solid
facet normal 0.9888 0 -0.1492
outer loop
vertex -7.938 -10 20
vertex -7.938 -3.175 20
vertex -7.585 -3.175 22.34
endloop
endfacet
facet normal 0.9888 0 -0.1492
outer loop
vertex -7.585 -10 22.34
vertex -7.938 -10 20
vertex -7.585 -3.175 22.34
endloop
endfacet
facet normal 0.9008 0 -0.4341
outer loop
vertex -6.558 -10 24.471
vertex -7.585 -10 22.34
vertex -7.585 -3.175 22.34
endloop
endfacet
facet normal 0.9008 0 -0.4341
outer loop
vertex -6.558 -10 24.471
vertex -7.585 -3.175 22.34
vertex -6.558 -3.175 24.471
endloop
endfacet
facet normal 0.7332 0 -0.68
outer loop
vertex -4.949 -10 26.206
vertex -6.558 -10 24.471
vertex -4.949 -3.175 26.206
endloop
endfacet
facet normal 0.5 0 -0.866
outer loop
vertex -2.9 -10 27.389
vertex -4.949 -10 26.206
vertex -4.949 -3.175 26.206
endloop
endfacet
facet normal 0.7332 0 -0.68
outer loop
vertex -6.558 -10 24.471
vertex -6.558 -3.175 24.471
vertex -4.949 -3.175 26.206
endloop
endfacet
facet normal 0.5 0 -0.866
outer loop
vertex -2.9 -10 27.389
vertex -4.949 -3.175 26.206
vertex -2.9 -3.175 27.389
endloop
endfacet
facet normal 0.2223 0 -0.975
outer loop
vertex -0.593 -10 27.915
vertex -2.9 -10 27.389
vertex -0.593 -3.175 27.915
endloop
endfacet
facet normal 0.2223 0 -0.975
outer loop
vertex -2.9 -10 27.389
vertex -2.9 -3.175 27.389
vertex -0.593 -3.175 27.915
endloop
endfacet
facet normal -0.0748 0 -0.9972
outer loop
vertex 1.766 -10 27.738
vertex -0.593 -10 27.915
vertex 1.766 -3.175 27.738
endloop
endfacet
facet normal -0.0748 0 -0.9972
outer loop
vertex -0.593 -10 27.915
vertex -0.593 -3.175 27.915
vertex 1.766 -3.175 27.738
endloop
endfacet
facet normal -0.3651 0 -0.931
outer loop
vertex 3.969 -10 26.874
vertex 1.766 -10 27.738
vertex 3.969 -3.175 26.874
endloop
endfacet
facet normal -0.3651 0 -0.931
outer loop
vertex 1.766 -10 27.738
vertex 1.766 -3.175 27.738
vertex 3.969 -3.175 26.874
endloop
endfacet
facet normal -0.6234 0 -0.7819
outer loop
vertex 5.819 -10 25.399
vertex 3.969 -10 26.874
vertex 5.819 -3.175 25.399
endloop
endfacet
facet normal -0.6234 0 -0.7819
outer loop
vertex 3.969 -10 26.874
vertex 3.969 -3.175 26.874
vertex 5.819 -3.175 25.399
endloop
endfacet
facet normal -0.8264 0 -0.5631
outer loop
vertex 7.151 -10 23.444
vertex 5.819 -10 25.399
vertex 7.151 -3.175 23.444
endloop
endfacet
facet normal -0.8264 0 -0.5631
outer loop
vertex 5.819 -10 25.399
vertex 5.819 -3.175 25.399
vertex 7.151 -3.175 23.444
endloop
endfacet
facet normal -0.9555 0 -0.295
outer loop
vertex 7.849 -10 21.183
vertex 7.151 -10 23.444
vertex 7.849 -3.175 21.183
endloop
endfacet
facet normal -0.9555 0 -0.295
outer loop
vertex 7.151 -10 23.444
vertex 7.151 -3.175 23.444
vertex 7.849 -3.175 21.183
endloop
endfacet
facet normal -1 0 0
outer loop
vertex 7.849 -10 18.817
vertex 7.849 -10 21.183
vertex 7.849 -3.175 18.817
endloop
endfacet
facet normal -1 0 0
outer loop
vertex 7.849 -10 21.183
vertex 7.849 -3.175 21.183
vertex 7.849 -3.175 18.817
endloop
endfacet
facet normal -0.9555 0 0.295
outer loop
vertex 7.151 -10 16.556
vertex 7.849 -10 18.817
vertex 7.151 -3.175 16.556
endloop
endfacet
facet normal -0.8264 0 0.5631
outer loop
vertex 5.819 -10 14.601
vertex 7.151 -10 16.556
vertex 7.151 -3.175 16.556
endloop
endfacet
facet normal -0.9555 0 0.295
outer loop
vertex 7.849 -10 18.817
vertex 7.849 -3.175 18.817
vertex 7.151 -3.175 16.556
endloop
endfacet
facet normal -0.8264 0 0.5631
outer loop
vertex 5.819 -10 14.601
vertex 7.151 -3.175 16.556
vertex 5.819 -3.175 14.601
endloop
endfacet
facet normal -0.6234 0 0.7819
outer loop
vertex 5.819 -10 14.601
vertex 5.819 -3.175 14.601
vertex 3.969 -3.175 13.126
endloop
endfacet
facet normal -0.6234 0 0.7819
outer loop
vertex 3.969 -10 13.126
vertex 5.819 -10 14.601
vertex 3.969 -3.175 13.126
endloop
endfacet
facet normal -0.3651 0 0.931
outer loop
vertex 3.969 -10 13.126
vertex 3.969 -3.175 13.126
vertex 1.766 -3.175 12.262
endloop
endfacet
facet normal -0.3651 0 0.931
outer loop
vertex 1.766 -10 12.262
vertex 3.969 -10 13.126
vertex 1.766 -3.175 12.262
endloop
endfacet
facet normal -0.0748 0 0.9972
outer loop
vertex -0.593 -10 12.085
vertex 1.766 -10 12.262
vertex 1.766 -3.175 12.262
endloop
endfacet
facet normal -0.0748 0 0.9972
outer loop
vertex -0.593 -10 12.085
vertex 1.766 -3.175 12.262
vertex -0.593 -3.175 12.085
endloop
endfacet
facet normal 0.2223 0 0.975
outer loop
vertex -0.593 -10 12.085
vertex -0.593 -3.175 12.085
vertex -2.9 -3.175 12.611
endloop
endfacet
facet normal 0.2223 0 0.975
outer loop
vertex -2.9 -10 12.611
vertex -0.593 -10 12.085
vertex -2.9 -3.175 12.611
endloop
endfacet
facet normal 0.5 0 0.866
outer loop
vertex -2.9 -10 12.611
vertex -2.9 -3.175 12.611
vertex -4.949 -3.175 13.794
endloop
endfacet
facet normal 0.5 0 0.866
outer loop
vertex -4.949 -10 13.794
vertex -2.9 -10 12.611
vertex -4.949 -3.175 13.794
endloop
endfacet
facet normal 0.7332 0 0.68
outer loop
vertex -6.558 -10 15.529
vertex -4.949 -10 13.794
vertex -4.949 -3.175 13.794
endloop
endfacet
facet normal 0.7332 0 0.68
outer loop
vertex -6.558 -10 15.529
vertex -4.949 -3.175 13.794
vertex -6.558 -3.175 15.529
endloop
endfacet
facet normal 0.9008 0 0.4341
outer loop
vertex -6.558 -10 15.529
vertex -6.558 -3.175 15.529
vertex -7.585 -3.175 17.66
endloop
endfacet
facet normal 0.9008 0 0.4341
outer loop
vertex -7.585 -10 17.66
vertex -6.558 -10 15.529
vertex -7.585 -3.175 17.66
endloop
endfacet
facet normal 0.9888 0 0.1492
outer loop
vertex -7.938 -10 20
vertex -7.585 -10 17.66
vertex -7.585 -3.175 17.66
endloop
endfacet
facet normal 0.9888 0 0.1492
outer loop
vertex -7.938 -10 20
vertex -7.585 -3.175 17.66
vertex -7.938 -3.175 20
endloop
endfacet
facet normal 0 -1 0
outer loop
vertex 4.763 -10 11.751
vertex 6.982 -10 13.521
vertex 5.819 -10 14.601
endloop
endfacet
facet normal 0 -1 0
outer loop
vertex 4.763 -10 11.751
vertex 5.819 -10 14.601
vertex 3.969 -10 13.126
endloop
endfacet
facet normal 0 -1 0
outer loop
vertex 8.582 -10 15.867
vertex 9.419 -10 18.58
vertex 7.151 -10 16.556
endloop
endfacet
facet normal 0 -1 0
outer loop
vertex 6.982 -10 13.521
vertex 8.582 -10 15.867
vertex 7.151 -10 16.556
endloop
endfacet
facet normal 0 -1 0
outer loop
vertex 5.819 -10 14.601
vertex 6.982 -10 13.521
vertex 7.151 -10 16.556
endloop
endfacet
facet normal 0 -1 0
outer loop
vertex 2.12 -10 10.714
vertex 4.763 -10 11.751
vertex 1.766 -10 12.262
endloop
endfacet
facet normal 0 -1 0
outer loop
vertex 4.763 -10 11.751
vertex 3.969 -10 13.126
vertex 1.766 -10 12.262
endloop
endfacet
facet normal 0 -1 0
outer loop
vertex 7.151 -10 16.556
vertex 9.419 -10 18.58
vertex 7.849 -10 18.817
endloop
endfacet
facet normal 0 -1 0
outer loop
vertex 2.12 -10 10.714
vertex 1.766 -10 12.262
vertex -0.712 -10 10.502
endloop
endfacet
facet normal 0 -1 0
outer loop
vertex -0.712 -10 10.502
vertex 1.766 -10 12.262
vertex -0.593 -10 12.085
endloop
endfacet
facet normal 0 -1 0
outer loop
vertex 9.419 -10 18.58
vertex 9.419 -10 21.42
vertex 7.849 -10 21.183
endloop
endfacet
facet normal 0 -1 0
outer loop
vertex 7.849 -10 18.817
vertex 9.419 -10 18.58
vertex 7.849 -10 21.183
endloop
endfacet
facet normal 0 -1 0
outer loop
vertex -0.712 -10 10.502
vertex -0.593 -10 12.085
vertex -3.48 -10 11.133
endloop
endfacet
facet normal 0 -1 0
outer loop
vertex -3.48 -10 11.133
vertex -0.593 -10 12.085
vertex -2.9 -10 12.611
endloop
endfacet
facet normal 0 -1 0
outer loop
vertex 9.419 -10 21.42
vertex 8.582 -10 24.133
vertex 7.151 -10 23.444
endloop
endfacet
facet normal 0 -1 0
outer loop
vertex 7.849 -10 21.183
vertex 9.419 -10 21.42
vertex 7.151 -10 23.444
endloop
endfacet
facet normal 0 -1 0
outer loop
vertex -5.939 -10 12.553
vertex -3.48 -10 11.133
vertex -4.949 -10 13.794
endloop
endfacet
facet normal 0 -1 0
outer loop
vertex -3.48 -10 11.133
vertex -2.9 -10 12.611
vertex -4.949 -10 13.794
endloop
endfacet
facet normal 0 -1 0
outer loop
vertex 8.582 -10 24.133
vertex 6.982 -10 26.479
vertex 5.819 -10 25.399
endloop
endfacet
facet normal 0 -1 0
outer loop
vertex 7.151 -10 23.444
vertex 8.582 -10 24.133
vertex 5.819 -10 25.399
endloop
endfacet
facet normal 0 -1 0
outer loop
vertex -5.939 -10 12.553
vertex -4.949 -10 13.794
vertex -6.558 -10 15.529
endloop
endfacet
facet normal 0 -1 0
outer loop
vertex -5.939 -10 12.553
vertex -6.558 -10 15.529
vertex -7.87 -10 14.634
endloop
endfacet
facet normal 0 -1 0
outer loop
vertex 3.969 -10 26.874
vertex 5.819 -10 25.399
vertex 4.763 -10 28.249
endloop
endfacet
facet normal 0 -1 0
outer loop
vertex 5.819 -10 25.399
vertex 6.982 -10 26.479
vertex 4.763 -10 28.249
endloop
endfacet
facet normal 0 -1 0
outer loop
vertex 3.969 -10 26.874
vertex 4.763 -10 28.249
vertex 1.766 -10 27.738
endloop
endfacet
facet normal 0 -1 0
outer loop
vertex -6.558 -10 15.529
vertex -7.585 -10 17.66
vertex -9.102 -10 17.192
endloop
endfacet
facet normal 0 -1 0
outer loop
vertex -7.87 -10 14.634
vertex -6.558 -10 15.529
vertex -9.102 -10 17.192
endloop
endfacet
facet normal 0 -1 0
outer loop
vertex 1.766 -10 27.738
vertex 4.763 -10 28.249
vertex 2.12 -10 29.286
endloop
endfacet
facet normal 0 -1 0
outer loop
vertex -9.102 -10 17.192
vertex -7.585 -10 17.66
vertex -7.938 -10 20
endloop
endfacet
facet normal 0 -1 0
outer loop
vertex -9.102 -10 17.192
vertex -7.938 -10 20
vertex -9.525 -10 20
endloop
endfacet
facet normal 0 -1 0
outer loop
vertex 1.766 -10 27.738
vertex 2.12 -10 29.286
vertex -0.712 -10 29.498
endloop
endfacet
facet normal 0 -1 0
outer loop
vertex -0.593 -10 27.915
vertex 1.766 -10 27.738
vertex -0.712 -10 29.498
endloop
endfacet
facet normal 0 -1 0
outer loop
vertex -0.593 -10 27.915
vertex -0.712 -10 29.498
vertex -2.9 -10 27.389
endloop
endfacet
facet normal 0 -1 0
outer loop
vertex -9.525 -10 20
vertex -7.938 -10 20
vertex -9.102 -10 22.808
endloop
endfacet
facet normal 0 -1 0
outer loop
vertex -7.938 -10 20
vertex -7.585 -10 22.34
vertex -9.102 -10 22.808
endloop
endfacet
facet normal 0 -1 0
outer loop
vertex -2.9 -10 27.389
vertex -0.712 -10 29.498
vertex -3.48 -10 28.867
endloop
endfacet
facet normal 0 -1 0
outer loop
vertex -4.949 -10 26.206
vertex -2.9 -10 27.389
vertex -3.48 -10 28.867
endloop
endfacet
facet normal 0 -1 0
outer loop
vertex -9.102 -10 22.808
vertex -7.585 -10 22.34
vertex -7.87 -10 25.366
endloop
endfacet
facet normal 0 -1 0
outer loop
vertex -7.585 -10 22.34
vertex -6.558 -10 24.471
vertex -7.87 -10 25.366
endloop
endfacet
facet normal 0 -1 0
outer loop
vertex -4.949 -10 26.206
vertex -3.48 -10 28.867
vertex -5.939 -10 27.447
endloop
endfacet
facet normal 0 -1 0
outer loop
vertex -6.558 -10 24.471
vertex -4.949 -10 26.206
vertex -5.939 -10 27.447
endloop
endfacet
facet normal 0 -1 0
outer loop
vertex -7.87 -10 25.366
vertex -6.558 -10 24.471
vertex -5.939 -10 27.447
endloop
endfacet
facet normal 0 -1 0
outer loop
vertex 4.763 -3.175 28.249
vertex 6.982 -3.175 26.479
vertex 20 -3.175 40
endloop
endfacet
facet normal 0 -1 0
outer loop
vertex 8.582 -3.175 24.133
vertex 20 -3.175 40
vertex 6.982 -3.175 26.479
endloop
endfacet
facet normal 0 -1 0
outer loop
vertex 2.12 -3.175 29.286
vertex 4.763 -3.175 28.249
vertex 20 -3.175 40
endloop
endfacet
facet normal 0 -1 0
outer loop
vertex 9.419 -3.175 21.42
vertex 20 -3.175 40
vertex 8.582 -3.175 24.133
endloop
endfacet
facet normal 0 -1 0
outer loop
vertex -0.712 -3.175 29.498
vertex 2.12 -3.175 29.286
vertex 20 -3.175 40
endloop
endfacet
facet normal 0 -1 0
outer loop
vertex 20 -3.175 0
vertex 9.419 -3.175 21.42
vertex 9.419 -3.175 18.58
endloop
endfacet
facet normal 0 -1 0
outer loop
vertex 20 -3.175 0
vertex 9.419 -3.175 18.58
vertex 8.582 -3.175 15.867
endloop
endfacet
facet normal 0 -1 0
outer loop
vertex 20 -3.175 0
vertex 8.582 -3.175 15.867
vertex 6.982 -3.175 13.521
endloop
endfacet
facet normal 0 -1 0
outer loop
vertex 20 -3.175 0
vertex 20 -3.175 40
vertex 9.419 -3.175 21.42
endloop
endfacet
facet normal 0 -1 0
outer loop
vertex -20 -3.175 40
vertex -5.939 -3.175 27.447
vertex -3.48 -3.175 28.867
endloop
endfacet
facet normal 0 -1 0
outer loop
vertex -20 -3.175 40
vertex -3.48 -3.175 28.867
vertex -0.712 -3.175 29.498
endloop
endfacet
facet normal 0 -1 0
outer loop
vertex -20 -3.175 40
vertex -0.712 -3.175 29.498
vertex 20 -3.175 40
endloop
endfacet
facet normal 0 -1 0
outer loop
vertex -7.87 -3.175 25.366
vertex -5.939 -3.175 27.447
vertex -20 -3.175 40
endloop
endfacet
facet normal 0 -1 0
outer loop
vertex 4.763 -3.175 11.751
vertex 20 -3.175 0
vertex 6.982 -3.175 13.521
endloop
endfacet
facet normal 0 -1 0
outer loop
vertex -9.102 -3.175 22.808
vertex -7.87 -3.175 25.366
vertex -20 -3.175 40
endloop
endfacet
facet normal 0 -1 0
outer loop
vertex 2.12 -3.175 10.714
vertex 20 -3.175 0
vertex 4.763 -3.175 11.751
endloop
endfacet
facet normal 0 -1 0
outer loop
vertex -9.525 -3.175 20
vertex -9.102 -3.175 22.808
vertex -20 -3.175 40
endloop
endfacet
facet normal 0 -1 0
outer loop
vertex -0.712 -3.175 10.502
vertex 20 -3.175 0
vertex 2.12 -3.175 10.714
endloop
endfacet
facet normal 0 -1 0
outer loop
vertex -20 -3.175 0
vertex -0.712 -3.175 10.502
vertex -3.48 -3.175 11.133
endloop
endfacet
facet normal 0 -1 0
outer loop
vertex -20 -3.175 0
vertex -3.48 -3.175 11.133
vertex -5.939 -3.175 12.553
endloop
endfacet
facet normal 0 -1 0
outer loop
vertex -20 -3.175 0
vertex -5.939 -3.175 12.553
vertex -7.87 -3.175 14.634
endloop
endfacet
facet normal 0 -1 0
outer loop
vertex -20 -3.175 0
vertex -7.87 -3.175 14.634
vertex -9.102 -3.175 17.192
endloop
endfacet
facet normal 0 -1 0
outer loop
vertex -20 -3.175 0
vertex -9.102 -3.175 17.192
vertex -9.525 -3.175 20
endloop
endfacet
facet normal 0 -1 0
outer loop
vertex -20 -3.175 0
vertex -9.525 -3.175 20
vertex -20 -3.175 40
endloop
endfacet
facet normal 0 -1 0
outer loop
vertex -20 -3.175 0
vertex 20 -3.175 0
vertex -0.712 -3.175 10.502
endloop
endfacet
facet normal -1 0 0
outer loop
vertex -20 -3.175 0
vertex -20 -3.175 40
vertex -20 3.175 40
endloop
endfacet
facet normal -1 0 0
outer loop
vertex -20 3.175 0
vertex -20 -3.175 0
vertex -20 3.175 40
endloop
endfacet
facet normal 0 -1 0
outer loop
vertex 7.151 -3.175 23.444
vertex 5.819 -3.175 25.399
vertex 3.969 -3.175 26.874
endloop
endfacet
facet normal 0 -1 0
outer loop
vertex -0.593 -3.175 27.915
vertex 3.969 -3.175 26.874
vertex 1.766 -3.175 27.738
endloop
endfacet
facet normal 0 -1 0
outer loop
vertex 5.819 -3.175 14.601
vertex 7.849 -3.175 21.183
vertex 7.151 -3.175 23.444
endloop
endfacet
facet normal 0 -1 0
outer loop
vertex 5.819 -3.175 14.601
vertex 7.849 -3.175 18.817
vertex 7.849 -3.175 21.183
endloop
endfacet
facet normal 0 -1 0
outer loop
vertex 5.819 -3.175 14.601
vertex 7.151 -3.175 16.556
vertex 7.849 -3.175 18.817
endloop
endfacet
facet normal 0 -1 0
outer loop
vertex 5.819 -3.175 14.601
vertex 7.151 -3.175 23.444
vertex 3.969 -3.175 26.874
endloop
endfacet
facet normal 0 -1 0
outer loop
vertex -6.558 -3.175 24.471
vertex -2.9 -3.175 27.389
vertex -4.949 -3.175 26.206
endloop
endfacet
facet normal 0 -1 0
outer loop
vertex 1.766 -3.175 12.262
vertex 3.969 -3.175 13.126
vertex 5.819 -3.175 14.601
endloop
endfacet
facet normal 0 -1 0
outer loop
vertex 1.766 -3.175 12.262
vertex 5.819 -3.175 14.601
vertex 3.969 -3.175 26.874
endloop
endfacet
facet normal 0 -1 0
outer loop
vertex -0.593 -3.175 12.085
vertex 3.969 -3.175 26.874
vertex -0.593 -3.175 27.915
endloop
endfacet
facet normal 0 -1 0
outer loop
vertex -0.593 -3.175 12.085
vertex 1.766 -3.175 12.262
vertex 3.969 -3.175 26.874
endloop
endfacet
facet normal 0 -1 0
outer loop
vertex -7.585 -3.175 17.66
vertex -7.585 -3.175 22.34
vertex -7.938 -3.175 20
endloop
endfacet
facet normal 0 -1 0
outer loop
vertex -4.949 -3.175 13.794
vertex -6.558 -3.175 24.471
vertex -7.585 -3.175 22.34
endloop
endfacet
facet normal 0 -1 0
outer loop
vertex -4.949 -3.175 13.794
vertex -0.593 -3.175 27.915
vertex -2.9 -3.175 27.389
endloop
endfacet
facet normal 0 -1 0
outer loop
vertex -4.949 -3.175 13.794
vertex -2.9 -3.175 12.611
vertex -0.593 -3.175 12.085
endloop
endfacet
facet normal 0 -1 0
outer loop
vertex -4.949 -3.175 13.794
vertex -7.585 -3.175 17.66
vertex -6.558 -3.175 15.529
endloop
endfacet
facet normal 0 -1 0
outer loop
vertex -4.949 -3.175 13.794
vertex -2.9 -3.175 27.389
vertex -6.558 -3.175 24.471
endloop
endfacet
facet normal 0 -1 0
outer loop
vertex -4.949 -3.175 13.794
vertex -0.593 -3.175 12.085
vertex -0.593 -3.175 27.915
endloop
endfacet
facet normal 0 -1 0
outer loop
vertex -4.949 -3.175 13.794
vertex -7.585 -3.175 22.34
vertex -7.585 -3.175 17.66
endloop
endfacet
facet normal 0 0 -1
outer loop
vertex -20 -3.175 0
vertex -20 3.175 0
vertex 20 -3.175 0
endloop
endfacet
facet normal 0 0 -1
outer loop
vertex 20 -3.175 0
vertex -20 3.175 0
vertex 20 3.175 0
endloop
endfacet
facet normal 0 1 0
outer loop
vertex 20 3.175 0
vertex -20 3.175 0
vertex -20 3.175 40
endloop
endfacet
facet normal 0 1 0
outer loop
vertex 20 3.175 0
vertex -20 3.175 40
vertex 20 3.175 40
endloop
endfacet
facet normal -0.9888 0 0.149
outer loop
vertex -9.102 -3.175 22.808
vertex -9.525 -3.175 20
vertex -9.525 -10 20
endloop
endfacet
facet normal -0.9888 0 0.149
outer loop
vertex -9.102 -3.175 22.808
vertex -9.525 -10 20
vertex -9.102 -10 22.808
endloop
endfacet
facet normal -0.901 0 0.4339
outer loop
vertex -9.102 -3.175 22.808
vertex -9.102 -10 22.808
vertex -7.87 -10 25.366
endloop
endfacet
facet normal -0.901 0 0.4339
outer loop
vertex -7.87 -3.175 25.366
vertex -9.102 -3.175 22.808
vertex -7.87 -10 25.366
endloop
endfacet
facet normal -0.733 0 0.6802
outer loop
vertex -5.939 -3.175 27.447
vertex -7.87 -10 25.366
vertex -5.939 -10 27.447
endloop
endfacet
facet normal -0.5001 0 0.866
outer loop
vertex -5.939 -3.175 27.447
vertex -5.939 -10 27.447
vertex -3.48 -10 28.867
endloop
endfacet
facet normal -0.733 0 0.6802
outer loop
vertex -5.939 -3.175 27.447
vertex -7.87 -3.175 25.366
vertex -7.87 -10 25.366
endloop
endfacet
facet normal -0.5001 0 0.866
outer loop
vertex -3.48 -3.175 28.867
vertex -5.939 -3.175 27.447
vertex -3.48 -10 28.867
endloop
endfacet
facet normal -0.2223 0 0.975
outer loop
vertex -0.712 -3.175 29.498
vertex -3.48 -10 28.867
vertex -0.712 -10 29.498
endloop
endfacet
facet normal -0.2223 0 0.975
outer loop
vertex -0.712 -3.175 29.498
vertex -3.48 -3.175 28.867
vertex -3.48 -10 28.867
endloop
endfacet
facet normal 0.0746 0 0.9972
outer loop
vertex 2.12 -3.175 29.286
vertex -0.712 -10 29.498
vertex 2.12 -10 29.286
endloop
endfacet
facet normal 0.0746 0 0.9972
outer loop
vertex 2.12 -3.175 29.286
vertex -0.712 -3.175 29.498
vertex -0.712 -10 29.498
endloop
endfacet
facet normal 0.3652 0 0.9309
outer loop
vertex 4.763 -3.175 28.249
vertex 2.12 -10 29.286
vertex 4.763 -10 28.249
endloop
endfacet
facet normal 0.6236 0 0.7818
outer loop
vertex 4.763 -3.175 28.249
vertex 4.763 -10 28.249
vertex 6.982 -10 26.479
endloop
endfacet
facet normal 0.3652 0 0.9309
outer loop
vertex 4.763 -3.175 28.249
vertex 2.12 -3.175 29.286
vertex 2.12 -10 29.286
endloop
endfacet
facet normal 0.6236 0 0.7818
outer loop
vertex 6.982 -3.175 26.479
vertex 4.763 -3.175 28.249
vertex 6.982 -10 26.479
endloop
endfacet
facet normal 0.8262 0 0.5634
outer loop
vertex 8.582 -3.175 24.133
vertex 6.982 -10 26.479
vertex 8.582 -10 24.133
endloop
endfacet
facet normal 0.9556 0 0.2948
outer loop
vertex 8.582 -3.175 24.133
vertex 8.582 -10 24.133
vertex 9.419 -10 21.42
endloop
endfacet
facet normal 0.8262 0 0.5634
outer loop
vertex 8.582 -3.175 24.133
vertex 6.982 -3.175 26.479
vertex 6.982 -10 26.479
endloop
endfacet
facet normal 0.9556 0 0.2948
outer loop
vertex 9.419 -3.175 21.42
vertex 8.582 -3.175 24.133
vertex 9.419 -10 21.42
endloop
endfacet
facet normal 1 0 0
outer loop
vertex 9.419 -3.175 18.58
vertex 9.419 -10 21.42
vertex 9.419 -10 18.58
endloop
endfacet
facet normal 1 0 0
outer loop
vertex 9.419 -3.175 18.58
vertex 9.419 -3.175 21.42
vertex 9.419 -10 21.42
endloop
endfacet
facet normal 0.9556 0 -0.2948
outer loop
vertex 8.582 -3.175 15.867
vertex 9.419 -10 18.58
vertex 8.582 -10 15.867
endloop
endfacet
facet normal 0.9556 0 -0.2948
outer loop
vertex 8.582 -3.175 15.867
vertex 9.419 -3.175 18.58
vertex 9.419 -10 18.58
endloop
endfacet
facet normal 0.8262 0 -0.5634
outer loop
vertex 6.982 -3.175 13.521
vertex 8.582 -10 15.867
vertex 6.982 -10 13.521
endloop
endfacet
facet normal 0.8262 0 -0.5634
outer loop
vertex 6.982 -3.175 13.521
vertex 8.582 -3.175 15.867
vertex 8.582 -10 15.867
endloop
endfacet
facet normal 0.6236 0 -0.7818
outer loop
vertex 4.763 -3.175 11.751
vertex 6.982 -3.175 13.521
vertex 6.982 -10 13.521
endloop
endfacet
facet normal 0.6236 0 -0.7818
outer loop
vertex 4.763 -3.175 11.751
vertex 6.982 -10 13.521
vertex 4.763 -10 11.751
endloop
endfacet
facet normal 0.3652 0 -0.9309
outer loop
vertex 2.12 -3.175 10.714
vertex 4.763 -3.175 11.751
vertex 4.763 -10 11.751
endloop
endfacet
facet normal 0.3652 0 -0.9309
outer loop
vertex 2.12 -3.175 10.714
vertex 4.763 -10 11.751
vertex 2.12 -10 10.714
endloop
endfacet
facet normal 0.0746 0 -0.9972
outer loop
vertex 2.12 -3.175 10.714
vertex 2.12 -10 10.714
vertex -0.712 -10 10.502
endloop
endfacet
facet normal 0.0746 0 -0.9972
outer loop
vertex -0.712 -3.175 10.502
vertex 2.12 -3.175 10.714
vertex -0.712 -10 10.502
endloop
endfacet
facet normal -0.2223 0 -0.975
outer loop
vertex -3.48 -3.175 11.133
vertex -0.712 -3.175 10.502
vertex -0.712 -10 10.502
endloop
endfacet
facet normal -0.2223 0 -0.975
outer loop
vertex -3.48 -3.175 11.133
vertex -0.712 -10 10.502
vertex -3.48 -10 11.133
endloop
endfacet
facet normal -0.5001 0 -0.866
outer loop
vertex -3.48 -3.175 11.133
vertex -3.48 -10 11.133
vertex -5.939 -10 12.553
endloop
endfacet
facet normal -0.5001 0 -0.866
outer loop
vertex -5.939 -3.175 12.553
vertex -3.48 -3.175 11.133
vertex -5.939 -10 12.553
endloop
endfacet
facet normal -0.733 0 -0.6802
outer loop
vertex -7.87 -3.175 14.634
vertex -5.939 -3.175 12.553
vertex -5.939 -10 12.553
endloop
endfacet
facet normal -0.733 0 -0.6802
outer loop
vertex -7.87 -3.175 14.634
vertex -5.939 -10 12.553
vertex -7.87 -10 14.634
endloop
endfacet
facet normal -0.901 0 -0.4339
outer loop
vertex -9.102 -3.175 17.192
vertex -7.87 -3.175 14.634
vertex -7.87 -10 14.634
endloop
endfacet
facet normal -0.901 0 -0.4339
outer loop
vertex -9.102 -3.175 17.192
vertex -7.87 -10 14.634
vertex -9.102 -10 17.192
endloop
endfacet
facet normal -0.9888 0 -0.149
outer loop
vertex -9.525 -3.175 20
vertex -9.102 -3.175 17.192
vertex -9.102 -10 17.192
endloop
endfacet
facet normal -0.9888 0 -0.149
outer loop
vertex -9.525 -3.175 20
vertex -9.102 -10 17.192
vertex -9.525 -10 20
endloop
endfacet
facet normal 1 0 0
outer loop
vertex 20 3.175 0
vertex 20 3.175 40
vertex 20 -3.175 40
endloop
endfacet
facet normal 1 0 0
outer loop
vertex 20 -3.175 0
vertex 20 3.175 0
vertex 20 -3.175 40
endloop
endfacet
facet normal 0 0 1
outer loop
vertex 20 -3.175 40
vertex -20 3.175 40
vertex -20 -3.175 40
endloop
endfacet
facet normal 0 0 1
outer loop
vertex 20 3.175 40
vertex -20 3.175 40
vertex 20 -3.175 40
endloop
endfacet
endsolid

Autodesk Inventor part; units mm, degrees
ref_plane "YZ Plane" through (0, 0, 0) normal (1, 0, 0) x (0, 1, 0)
ref_plane "XZ Plane" through (0, 0, 0) normal (0, 1, 0) x (-1, 0, 0)
ref_plane "XY Plane" through (0, 0, 0) normal (0, 0, 1) x (1, 0, 0)
sketch "Sketch1" plane through (0, 0, 0) normal (0, 0, 1) x (1, 0, 0)
  line L0 (-20, 3.175) -> (20, 3.175)
  line L1 (20, 3.175) -> (20, -3.175)
  line L2 (20, -3.175) -> (-20, -3.175)
  line L3 (-20, -3.175) -> (-20, 3.175)
  line L4 (0, 10.7485) -> (0, -11.1125)
  point P0 (0, 0)
  dimension "d5" = 40
extrude "Extrusion1" add sketch "Sketch1" along normal blind 40
sketch "Sketch2" plane through (0, 0, 0) normal (0, 1, 0) x (-1, 0, 0)
  circle A0 centre (0, 20) radius 7.9375
  circle A1 centre (0, 20) radius 9.525
  line L0 (20, 0) -> (-20, 0) projected
  point P0 (0, 0)
  dimension "d2" = 15.875
  dimension "d6" = 20
extrude "Extrusion2" add sketch "Sketch2" against normal blind 10
properties part number "BindingPiece1"
